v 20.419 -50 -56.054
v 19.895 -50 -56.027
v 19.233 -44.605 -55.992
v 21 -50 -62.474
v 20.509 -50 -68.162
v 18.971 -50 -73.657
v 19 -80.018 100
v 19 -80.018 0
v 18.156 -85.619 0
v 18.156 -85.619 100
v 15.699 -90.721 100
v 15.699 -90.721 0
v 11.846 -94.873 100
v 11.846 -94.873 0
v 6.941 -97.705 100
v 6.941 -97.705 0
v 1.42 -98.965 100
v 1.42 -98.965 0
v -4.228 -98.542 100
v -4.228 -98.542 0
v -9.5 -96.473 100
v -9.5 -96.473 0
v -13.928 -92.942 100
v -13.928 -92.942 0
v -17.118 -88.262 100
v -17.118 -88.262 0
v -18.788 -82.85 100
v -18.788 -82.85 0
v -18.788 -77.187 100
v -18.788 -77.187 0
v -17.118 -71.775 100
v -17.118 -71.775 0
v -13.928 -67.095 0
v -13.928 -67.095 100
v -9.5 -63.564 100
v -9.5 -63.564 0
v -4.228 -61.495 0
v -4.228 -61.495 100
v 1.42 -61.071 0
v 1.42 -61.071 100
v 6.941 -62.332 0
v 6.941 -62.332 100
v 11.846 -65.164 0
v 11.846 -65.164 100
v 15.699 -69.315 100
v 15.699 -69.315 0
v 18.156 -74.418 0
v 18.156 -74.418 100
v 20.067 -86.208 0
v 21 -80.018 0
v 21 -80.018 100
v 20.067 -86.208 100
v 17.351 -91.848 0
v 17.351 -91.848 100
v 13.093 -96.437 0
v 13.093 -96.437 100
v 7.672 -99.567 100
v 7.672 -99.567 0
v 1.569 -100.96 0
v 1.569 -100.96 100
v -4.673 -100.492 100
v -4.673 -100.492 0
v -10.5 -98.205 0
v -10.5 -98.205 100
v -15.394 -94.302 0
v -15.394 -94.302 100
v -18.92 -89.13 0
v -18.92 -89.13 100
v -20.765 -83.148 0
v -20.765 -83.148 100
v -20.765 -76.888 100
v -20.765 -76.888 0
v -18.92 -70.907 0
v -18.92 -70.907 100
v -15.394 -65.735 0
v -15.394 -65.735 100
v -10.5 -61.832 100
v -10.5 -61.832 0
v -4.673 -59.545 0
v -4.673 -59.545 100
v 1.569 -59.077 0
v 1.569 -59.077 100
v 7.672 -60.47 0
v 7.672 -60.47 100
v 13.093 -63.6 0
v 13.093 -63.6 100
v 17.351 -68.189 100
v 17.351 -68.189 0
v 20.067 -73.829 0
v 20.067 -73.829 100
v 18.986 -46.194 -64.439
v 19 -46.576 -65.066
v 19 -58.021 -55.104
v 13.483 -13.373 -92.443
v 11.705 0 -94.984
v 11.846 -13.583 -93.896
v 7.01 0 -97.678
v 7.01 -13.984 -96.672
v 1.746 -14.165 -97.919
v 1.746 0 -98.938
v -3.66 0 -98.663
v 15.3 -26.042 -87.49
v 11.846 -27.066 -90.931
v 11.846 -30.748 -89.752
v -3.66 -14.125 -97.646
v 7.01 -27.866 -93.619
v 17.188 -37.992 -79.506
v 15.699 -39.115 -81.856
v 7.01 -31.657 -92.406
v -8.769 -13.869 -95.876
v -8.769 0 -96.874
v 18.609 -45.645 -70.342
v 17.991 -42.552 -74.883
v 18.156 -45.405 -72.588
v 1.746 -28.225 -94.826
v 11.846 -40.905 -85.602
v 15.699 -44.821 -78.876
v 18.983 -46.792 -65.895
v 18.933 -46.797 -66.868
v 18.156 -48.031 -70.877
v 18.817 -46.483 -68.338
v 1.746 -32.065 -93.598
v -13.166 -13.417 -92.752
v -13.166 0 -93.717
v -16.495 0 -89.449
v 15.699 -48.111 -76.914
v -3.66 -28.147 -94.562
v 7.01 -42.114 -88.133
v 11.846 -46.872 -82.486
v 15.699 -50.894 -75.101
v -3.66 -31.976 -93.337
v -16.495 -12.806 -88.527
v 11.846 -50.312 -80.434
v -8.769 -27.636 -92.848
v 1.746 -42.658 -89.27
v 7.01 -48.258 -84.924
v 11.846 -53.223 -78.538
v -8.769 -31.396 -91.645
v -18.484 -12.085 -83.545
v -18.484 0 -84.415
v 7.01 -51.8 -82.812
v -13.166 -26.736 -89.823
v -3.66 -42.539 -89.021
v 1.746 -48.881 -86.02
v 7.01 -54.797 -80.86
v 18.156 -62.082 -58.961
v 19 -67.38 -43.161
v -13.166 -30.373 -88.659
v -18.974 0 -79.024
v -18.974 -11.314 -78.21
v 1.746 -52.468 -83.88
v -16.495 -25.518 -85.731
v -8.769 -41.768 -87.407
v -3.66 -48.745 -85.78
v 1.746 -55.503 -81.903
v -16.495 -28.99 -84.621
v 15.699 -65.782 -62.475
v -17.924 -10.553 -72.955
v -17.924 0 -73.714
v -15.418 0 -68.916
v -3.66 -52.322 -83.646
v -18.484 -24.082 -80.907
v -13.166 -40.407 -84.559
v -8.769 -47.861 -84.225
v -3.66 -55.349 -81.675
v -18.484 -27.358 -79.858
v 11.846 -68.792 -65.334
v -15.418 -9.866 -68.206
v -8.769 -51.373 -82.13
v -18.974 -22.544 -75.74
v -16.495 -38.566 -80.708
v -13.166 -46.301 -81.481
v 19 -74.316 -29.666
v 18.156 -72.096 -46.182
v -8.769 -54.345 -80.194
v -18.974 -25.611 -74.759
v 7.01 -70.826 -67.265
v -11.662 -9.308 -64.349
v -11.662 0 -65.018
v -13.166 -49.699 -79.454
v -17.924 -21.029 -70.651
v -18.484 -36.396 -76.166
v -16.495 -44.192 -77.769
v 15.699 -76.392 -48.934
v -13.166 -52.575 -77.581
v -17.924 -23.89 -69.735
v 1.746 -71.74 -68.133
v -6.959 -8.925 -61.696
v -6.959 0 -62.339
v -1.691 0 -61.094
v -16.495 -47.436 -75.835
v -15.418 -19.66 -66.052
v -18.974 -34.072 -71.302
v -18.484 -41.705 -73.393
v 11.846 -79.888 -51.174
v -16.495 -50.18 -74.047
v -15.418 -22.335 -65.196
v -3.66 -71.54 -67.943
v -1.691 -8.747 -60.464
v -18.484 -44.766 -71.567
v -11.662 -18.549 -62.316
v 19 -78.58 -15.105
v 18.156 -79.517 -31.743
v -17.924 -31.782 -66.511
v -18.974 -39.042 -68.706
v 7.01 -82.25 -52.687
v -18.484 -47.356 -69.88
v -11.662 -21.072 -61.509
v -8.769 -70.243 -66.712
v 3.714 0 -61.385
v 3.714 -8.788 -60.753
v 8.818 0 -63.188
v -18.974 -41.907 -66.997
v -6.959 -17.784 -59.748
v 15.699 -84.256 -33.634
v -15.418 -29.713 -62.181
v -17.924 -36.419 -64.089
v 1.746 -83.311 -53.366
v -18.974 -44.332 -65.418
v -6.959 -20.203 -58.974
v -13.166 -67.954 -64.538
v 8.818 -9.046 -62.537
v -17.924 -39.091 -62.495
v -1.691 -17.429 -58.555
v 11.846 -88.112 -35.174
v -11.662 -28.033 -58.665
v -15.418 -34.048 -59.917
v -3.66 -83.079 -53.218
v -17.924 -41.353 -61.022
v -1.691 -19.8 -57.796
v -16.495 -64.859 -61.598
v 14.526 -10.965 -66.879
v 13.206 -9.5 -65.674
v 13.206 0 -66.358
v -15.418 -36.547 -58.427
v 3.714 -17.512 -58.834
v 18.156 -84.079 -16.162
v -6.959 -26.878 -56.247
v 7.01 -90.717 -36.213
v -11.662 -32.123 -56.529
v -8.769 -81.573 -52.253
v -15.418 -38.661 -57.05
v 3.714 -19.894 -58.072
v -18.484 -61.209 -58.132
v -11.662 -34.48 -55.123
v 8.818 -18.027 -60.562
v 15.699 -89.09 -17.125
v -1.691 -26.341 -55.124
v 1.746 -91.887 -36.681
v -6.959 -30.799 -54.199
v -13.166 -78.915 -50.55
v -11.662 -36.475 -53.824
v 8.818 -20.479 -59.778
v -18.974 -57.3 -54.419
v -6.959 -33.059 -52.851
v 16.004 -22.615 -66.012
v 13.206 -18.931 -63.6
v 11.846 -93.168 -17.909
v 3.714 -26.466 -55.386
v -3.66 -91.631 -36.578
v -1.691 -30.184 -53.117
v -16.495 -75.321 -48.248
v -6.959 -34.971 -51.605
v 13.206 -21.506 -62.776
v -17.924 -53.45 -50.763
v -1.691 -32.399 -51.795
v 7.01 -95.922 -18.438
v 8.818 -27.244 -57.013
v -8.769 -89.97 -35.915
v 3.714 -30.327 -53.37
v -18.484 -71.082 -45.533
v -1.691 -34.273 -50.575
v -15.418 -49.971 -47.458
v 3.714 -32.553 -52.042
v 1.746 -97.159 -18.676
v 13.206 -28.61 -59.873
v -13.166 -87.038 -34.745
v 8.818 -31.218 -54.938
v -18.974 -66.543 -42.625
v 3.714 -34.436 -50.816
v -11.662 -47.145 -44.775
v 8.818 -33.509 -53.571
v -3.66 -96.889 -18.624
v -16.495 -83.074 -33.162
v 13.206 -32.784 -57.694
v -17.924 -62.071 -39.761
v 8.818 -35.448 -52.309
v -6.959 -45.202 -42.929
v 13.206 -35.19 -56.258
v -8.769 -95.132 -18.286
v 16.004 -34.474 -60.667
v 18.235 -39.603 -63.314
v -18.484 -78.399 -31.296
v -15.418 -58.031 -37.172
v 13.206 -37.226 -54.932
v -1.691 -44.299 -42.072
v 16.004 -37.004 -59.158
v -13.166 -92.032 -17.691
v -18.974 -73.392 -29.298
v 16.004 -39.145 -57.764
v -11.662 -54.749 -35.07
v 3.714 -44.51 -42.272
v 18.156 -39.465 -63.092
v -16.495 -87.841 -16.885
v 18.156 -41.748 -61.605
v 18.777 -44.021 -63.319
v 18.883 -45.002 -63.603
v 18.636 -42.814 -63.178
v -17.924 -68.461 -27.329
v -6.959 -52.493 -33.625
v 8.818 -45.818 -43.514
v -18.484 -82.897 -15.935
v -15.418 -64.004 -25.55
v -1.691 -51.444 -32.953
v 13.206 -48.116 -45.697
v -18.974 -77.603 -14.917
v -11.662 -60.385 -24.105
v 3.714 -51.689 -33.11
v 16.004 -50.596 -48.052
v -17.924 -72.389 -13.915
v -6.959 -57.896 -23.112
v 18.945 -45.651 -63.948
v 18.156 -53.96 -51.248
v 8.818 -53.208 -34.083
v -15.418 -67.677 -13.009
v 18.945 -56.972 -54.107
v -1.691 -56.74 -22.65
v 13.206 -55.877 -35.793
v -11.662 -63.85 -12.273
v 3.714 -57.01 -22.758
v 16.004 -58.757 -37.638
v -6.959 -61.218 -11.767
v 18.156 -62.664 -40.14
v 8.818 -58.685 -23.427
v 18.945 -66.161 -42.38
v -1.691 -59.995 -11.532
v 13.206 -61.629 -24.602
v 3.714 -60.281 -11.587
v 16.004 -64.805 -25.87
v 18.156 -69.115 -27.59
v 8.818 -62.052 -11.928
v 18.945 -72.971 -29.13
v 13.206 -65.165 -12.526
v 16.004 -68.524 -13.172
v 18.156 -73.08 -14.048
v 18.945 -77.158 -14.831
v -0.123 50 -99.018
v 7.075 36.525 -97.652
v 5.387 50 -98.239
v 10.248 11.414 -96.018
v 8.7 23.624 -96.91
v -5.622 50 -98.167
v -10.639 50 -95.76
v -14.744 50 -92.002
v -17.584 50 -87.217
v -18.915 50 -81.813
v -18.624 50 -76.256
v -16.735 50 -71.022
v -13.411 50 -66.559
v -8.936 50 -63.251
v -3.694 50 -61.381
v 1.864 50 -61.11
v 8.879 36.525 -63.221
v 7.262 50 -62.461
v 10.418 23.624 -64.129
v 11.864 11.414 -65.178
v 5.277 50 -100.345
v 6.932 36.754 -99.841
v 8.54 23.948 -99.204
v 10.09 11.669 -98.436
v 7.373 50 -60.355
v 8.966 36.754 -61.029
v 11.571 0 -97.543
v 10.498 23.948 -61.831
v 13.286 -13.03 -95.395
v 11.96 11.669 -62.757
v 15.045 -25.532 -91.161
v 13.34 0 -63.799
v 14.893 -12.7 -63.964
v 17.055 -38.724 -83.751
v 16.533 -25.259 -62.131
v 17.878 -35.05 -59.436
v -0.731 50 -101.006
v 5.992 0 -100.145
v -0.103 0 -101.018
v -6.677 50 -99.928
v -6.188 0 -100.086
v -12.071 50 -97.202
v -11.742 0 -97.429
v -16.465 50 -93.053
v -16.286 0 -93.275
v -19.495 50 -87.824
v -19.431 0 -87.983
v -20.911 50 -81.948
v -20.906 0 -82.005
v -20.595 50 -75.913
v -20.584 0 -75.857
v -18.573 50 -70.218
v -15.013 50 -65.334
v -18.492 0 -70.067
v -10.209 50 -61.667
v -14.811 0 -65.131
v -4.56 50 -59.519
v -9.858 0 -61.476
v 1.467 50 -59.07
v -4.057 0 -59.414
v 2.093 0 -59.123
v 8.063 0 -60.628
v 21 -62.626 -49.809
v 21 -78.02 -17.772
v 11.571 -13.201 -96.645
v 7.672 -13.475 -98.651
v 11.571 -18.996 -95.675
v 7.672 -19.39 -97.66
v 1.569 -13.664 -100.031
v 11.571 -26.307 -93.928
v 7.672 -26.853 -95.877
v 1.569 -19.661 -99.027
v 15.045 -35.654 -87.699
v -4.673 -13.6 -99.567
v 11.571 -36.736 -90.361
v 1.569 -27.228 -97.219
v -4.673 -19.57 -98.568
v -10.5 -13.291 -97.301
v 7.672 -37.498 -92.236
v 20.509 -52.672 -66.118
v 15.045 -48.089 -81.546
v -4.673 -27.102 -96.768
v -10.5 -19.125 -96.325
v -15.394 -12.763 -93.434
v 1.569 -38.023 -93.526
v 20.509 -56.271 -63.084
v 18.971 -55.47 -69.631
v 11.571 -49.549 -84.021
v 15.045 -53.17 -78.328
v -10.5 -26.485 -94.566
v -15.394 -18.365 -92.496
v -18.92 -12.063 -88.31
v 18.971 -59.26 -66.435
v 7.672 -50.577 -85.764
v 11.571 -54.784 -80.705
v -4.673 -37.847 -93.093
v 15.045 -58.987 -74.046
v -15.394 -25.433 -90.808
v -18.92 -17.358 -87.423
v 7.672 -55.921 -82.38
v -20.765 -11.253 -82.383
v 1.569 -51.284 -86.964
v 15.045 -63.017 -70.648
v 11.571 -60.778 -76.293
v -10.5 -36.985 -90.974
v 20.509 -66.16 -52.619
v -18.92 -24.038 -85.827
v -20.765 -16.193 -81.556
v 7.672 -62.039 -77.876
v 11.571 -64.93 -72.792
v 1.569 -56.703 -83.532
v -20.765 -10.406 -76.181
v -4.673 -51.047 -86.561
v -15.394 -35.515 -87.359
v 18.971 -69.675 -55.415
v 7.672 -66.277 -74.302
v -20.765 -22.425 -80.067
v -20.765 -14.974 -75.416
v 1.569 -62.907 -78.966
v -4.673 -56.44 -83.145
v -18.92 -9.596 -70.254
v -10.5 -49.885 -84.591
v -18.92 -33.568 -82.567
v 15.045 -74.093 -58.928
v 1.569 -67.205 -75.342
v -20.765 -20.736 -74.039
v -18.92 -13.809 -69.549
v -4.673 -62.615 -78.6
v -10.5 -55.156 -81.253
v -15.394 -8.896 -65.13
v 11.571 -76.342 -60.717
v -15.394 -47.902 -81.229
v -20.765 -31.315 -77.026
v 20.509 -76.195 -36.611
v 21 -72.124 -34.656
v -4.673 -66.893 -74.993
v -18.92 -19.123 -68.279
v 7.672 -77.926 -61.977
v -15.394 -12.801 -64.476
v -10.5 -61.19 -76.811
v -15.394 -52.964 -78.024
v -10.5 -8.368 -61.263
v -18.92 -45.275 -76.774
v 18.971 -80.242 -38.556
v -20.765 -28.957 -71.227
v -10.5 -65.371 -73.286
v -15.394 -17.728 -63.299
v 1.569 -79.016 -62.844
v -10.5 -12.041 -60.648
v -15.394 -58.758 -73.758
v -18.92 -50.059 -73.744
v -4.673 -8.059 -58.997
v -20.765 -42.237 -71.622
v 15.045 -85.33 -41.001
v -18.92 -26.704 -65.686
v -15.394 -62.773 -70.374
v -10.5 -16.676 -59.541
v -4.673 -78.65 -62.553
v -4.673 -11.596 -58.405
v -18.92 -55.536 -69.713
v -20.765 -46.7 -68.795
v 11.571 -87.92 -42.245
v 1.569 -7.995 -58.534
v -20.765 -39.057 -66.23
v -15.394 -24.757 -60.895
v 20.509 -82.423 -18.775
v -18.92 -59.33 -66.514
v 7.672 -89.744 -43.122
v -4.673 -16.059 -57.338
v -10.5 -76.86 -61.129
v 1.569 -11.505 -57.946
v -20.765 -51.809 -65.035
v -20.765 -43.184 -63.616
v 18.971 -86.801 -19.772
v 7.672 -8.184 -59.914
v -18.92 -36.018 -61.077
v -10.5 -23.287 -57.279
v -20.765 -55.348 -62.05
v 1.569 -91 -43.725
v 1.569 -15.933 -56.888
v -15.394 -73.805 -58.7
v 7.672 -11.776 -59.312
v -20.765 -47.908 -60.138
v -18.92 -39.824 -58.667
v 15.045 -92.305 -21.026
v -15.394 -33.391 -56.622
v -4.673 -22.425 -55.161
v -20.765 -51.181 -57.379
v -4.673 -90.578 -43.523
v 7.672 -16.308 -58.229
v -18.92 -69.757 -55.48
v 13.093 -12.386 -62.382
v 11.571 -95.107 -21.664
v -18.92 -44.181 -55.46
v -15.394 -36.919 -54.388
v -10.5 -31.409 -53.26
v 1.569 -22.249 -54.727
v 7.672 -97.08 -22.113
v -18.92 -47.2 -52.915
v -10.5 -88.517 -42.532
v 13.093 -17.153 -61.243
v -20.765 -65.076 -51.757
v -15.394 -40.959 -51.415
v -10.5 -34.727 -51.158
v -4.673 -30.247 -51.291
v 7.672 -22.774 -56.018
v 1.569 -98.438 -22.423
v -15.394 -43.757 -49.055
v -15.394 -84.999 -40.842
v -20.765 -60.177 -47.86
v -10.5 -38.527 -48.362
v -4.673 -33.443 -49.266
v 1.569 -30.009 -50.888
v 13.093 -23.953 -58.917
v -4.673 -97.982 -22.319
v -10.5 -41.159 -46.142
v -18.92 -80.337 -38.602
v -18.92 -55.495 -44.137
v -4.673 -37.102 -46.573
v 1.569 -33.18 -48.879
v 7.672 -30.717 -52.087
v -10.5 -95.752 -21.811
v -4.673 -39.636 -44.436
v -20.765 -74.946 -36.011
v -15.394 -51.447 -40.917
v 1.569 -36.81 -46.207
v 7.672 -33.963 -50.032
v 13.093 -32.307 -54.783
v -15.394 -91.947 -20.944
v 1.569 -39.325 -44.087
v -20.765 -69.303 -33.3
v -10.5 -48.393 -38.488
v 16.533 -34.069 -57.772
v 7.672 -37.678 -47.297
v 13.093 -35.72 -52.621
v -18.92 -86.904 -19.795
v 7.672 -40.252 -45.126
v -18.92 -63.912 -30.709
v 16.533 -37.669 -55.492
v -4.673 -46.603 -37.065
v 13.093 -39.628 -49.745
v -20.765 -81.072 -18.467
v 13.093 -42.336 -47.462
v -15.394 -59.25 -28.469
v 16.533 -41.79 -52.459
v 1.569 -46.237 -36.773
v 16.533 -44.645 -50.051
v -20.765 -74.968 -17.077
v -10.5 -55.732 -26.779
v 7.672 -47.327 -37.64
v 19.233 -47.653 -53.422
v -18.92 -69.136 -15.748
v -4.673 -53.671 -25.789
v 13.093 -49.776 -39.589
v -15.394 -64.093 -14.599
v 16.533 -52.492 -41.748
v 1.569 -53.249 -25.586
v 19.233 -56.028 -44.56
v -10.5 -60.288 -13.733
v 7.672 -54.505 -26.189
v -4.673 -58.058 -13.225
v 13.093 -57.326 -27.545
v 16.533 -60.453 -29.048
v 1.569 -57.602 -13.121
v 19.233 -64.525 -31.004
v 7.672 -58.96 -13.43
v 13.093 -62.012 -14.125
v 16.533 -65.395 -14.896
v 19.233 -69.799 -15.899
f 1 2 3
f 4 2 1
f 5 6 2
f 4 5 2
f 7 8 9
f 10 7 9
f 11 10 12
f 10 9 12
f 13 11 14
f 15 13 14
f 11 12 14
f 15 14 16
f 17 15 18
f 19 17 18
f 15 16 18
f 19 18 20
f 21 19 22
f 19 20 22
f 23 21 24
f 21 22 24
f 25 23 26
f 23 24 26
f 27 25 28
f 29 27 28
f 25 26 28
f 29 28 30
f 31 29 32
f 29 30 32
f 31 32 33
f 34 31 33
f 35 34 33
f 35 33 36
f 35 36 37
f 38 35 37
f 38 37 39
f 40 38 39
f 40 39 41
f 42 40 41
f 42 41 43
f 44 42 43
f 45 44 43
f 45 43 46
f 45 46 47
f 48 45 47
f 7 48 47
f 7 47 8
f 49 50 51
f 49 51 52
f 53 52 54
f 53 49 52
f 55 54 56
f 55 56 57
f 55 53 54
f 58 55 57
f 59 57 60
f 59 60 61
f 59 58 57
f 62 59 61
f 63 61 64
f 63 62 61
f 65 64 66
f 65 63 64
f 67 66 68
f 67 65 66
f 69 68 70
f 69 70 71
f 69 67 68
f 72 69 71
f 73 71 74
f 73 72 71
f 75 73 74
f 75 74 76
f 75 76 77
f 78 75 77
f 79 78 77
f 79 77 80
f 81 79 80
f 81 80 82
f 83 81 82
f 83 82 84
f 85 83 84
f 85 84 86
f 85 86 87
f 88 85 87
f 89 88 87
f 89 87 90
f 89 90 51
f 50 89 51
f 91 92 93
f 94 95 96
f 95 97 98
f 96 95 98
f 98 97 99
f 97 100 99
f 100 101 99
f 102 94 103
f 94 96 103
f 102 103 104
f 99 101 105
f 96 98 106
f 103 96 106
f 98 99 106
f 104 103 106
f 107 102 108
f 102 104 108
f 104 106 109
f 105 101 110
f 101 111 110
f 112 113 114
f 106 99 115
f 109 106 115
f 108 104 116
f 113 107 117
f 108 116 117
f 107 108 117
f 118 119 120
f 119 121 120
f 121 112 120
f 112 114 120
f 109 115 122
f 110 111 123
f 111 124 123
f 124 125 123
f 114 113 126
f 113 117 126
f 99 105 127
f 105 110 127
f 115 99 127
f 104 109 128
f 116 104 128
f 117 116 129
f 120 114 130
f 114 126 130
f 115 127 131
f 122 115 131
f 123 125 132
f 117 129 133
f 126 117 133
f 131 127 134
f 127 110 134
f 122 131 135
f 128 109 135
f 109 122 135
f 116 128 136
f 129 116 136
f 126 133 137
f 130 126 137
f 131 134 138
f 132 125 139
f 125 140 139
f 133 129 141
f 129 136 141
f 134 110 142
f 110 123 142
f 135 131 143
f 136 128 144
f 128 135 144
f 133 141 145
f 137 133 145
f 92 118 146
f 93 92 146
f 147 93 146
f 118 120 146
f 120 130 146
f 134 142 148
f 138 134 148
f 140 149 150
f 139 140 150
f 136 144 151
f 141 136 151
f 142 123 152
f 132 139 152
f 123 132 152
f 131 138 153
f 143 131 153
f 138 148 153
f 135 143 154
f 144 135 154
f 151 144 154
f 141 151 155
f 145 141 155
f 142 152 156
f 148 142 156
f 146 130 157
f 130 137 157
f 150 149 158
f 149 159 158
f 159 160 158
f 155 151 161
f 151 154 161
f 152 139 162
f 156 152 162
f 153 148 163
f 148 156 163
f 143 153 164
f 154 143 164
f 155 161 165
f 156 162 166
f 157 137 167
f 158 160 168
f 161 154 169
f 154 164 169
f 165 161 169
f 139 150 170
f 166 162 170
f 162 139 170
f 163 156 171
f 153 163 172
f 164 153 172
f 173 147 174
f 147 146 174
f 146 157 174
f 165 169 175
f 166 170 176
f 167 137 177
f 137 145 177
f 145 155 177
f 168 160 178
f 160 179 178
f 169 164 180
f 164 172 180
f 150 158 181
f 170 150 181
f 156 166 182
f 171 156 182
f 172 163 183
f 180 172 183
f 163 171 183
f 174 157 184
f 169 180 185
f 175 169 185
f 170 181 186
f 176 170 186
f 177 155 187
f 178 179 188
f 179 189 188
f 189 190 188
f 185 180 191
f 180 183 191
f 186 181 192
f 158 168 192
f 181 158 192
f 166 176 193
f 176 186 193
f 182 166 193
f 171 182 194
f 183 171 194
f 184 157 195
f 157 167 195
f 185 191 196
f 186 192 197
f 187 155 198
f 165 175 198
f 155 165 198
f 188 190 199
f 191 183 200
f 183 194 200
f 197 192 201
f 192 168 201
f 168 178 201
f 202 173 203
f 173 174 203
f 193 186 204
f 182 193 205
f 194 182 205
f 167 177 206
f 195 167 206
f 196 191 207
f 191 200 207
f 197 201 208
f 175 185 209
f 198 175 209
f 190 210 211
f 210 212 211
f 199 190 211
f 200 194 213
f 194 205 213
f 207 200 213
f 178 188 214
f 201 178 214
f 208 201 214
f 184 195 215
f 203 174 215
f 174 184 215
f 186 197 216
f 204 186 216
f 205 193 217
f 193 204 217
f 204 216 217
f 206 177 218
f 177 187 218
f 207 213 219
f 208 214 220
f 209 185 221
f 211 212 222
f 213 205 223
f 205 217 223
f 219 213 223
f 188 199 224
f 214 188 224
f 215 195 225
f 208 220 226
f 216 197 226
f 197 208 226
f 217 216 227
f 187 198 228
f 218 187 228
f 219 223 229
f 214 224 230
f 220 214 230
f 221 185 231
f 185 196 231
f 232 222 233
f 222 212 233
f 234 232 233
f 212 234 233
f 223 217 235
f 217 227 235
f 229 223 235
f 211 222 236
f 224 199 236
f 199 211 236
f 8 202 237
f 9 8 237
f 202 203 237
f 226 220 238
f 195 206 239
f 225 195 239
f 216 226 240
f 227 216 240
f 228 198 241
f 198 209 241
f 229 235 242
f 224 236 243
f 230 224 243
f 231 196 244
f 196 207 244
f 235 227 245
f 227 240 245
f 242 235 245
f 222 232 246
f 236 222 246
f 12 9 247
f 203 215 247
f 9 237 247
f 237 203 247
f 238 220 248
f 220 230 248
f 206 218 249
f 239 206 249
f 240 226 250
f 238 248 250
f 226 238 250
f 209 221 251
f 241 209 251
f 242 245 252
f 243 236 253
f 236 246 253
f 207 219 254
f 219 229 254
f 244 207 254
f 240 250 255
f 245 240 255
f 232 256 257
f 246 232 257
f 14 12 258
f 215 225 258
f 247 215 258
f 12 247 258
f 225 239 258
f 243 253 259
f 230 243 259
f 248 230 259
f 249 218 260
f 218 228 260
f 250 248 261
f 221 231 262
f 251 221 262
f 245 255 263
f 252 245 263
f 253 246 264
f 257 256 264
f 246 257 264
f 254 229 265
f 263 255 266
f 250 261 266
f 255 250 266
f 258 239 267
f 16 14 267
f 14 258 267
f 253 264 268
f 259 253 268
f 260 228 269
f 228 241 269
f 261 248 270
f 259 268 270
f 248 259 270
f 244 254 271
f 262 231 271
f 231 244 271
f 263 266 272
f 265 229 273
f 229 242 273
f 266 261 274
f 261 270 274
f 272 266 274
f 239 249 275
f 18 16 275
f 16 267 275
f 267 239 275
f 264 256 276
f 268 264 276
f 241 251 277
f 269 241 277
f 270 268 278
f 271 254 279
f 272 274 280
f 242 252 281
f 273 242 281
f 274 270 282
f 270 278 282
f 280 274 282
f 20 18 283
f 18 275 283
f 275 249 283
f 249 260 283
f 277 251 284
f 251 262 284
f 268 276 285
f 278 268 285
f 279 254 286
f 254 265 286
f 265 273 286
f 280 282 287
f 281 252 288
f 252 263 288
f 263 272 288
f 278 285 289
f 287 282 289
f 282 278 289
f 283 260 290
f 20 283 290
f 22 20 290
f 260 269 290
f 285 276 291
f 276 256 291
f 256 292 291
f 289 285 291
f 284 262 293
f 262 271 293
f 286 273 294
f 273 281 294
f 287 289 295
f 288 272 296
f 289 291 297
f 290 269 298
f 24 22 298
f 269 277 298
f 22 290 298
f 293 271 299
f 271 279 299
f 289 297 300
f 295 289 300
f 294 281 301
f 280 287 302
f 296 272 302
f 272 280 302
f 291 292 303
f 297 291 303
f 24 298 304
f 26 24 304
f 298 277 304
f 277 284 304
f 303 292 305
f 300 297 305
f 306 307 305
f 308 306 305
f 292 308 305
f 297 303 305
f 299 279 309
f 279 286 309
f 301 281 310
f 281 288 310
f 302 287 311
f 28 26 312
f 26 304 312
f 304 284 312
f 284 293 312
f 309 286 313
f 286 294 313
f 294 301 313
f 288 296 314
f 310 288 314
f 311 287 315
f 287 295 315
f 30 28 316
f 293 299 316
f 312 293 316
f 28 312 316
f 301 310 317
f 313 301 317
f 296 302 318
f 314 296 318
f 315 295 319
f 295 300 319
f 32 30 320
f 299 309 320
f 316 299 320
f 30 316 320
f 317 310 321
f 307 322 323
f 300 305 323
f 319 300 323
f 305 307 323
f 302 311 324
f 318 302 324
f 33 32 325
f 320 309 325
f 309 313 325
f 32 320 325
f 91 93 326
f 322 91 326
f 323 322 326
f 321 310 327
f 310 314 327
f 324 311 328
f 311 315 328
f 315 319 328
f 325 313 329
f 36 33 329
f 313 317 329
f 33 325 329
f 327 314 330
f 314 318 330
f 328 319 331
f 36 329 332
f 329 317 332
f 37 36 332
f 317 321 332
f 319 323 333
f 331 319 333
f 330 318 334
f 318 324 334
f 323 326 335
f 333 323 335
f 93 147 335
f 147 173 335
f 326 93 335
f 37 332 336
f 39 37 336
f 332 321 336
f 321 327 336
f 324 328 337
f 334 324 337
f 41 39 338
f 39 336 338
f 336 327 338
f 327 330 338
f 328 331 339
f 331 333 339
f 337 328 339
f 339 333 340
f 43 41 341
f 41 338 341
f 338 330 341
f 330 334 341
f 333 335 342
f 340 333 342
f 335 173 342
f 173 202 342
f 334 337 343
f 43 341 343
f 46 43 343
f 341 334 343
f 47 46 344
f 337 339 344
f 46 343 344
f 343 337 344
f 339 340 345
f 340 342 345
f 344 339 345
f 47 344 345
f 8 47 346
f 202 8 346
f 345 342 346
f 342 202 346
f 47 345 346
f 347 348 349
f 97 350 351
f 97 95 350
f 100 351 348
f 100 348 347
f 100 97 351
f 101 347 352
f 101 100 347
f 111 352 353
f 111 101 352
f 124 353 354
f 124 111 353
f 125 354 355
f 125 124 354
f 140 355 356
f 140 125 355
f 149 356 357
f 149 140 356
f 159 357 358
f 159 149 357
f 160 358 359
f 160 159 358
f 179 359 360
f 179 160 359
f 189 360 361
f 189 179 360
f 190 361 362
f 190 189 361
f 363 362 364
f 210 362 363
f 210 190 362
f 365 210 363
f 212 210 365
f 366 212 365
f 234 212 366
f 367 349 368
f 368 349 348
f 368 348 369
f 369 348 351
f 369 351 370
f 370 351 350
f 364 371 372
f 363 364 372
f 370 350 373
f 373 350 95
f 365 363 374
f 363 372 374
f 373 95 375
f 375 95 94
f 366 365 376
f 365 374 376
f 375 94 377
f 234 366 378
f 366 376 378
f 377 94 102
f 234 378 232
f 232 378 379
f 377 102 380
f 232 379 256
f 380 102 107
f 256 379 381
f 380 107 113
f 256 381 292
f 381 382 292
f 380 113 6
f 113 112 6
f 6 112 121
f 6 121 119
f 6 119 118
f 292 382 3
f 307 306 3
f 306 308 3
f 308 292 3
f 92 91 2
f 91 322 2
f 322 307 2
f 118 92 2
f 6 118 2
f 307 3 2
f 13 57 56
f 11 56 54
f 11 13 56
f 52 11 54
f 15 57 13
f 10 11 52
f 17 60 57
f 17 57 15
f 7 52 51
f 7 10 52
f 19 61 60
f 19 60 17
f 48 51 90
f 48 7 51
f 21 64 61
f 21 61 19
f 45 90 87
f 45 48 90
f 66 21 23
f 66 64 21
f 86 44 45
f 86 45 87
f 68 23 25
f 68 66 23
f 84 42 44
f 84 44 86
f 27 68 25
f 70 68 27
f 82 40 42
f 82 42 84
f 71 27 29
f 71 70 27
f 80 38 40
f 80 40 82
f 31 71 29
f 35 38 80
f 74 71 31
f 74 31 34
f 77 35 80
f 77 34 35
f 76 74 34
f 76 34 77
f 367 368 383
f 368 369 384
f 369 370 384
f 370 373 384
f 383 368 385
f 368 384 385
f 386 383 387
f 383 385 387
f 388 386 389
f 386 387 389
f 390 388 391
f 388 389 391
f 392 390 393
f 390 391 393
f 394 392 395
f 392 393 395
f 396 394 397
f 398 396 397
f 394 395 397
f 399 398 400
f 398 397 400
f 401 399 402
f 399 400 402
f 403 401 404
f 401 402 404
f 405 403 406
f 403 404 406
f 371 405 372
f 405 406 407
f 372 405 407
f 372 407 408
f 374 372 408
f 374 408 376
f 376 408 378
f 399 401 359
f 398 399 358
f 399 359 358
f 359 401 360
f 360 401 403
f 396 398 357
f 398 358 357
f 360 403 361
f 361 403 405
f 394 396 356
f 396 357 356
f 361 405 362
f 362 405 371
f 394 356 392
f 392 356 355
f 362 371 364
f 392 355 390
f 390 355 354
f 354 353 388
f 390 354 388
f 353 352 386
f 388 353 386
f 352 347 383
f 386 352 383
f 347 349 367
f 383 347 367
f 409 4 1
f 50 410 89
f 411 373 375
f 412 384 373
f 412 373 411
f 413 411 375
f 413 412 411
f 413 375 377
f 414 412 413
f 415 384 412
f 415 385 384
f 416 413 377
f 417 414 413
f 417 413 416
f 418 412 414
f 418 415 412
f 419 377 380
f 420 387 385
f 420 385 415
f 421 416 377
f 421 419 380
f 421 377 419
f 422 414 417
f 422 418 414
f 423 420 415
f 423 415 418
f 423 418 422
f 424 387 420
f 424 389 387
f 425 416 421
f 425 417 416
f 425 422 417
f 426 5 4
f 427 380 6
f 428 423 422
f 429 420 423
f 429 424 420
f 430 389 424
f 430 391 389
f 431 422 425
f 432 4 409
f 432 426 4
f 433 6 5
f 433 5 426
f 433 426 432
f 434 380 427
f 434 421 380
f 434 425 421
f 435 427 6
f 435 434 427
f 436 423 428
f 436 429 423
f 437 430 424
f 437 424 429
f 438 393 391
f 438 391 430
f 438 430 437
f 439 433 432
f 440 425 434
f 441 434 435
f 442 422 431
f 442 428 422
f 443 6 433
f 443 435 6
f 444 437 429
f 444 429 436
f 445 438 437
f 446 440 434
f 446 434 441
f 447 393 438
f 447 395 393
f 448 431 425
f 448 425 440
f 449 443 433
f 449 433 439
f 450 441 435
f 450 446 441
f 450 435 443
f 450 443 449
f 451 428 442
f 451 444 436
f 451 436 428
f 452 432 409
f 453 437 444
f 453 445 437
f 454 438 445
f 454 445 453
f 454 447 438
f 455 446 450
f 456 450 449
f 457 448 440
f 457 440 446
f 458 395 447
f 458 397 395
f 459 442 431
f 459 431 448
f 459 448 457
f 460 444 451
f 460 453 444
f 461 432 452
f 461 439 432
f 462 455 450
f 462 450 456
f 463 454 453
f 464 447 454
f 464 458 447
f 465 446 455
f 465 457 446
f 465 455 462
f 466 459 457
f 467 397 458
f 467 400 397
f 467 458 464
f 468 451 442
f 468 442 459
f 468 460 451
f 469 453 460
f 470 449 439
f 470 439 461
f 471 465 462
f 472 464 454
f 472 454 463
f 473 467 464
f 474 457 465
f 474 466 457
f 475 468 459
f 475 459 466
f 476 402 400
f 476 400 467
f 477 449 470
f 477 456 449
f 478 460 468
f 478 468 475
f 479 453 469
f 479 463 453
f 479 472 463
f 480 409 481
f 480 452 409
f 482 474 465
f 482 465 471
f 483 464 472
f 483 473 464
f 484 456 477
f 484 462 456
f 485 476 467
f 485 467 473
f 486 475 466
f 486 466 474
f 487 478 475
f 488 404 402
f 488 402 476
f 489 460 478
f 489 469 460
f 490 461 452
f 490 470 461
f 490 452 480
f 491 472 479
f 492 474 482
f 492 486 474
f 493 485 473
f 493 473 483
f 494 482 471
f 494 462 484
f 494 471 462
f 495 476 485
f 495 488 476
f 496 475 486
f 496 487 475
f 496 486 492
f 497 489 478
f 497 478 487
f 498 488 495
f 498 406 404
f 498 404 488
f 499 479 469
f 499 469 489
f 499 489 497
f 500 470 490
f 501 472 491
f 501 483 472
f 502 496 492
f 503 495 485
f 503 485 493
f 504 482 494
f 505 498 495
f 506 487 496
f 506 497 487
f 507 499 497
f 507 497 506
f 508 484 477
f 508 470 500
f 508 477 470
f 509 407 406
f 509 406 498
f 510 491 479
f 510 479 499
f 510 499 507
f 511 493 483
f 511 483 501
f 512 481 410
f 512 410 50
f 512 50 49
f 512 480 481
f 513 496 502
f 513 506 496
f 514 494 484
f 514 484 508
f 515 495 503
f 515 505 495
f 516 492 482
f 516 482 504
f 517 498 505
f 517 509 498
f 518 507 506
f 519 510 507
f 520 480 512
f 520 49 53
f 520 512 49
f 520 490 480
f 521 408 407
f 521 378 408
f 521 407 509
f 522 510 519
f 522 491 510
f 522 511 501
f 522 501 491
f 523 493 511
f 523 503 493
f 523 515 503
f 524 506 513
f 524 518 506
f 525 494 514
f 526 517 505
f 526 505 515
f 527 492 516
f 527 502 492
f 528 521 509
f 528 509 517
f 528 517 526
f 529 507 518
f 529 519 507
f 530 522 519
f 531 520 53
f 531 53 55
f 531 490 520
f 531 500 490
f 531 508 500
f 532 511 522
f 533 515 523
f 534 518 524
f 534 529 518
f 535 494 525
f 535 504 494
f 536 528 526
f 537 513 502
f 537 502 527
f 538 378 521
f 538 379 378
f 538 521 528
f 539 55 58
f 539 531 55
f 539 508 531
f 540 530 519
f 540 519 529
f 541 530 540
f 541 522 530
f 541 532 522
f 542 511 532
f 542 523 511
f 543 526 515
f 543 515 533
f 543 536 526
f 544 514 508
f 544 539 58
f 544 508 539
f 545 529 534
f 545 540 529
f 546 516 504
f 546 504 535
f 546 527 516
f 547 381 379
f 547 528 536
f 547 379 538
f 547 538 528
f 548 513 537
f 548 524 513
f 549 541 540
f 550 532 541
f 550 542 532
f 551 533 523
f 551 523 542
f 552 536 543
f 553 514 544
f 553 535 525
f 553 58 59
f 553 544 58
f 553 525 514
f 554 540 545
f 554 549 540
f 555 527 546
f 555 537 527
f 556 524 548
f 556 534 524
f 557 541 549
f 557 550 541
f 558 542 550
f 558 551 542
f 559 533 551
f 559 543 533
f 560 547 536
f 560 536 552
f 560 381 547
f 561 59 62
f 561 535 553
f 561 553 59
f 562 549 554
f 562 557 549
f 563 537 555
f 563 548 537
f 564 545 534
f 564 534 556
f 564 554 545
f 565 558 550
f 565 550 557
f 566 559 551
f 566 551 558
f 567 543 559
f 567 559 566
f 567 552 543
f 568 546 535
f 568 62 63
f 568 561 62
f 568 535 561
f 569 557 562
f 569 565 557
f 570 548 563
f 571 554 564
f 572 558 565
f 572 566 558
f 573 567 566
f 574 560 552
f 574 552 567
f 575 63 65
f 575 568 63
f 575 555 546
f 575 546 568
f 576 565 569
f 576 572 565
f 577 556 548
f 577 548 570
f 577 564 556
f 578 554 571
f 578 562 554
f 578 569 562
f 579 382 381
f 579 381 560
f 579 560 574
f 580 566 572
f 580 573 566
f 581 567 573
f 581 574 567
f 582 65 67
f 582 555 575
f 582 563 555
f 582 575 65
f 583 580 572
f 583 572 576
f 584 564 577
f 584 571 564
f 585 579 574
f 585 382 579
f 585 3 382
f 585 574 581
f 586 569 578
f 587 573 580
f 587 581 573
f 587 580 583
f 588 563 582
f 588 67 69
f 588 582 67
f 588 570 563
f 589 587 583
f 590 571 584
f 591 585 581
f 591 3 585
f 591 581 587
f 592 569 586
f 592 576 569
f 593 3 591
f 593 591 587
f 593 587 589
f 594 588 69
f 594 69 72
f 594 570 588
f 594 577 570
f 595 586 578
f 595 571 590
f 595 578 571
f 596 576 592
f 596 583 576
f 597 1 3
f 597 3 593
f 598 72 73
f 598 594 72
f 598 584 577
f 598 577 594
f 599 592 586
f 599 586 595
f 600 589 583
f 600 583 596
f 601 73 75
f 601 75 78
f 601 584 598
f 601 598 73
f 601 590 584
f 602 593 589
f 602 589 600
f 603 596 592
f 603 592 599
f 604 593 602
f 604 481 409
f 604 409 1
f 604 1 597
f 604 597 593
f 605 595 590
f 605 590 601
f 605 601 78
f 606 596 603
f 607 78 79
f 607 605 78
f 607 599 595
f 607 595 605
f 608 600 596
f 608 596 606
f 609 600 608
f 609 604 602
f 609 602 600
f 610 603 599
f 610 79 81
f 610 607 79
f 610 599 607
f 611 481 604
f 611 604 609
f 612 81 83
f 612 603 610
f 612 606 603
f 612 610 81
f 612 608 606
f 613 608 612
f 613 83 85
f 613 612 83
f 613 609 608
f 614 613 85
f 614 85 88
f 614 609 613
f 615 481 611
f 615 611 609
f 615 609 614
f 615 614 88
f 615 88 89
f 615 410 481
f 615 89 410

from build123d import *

# Parameters (mm, degrees)
F1_R     = 21
F1_R_2   = 19
F3_DEPTH = 100
F4_DEPTH = 50
F7_DEPTH = 25


with BuildPart() as f2:
    # F2: sweep along a path in F0
    with BuildLine(Plane.YZ) as f2_path:
        ThreePointArc((0, -80), (-56.5685424949, -56.5685424949), (-80, 0))
    # F1 (on Top) → F2 (sweep)
    with BuildSketch(Plane.XY):
        with Locations((0, -80.018363893)):
            Circle(F1_R)
        with Locations((0, -80.018363893)):
            Circle(F1_R_2, mode=Mode.SUBTRACT)
    sweep(path=f2_path.line)

    # F3 (add): a face of the model
    f3_faces = [f2.faces().sort_by_distance(p)[0] for p in [
        (-20.4060303038, -80.018363893, 0),
    ]]
    extrude(f3_faces, amount=F3_DEPTH)

    # F4 (add): a face of the model
    f4_faces = [f2.faces().sort_by_distance(p)[0] for p in [
        (-20.4060303038, 0, -80.018363893),
    ]]
    extrude(f4_faces, amount=F4_DEPTH)

    # F6 (on face) → F7 (cut, symmetric)
    with BuildSketch(Plane(origin=(-4.1820983055, 0, -79.7991894081), x_dir=(0.9986295348, 0, -0.0523359562), z_dir=(0.0523359562, 0, 0.9986295348))):
        Polygon((58.3756751827, 50), (23.1878375913, 50), (10.5211709247, 50), (22.799627015, -50), (58.3756751827, -50), align=None)
    extrude(amount=F7_DEPTH, both=True, mode=Mode.SUBTRACT)


solid = f2.part
